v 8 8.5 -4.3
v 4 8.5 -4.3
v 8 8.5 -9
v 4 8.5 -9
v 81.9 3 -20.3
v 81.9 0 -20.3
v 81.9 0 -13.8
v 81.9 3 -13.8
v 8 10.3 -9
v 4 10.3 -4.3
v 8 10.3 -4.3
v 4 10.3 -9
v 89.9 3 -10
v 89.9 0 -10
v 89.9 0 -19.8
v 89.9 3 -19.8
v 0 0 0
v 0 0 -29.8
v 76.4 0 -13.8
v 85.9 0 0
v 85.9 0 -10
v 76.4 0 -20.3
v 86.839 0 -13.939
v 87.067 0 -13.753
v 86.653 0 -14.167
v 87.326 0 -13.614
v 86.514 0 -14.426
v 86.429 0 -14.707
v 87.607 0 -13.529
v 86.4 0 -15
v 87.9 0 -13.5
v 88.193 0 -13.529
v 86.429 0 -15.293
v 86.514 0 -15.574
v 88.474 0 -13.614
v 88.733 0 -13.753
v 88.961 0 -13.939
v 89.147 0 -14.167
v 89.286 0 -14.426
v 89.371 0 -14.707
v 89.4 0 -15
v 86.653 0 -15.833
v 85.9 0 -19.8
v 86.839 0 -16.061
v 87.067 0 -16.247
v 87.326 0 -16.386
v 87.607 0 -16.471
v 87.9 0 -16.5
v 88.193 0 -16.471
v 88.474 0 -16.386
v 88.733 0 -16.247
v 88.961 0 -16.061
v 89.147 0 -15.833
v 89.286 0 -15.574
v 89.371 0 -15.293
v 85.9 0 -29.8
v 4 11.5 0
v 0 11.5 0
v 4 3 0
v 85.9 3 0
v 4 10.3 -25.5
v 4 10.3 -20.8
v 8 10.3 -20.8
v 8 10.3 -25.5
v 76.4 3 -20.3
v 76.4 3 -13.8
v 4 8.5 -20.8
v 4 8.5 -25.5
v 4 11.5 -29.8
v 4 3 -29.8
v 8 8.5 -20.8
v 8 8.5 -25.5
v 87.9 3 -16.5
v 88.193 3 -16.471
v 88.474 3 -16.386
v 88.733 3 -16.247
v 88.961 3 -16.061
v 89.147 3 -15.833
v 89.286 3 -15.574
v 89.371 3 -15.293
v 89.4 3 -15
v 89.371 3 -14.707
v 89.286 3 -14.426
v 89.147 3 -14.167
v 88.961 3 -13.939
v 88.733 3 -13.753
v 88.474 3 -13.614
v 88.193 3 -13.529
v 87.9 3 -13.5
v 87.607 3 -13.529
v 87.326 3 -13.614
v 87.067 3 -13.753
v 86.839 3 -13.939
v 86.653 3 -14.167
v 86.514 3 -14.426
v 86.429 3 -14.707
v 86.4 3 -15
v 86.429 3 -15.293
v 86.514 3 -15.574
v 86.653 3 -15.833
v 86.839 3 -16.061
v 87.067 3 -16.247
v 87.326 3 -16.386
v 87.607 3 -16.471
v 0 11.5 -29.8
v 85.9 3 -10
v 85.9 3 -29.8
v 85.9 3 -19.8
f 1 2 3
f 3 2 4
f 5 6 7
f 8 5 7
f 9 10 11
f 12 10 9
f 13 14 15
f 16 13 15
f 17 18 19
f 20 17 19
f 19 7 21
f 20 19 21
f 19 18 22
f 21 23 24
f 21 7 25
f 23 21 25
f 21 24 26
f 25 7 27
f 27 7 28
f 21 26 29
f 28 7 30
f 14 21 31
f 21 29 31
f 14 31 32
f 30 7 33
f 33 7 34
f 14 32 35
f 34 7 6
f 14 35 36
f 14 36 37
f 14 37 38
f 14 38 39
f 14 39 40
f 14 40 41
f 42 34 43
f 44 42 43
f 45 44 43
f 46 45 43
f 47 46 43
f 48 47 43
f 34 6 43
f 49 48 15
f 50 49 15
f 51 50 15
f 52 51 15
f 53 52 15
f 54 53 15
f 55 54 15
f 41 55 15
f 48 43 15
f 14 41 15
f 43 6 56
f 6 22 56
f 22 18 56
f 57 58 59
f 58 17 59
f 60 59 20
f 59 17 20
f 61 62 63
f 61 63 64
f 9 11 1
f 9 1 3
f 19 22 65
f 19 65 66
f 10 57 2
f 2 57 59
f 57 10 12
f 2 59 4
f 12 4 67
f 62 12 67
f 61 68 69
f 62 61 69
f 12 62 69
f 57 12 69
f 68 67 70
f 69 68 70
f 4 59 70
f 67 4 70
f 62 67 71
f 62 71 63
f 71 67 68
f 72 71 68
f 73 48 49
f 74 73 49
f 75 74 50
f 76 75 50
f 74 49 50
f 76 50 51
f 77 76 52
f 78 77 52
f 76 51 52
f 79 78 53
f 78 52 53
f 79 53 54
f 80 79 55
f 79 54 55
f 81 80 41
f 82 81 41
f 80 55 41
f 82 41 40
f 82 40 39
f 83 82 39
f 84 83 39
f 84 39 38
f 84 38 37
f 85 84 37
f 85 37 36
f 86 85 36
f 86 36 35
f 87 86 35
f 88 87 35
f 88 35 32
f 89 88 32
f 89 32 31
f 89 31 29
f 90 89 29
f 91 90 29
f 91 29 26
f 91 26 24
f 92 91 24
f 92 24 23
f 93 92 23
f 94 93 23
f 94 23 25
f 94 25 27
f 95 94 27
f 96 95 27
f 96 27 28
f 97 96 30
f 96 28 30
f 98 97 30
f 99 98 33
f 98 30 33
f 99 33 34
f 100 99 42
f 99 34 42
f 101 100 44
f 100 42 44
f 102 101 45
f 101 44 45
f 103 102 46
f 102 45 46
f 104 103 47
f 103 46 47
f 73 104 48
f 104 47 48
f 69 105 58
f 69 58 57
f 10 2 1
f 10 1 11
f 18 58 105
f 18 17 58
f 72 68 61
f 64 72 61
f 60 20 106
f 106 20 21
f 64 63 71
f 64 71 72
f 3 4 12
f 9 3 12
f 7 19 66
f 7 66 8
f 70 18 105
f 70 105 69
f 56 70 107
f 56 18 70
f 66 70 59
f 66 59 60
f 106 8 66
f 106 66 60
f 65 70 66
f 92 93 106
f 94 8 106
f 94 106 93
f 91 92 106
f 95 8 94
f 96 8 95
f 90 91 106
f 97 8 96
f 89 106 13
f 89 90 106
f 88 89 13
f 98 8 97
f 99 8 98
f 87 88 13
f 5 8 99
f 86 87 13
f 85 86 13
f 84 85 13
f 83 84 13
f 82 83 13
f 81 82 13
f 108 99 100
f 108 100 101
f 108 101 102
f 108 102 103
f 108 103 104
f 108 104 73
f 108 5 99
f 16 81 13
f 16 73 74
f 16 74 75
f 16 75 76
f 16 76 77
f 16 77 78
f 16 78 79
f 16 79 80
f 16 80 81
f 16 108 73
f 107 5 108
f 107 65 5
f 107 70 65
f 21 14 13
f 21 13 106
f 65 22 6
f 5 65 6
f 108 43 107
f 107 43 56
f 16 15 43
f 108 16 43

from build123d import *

# Parameters (mm, degrees)
SKETCH1_W           = 89.9
SKETCH1_H           = 29.8
BOSS_EXTRUDE1_DEPTH = 3
SKETCH8_R           = 1.5
SKETCH8_W           = 4
SKETCH8_H           = 10
CUT_EXTRUDE5_DEPTH  = 5
SKETCH12_W          = 5.5
SKETCH12_H          = 6.5
CUT_EXTRUDE8_DEPTH  = 10
SKETCH15_W          = 4
SKETCH15_H          = 29.8
BOSS_EXTRUDE2_DEPTH = 8.5
SKETCH16_W          = 4.7
SKETCH16_H          = 1.8
BOSS_EXTRUDE3_DEPTH = 4


with BuildPart() as part:
    # Sketch1 → Boss-Extrude1 (new body)
    with BuildSketch(Plane(origin=(0, 0, 0), x_dir=(1, 0, 0), z_dir=(0, 1, 0))):
        with Locations((44.95, 14.9)):
            Rectangle(SKETCH1_W, SKETCH1_H)
    extrude(amount=BOSS_EXTRUDE1_DEPTH)

    # Sketch8 → Cut-Extrude5 (cut)
    with BuildSketch(Plane(origin=(0, 0, 0), x_dir=(-1, 0, 0), z_dir=(0, -1, 0))):
        with Locations(Location((-87.9, 15, 0), (0, 0, 90))):
            Circle(SKETCH8_R)
        with Locations((-87.9, 5)):
            Rectangle(SKETCH8_W, SKETCH8_H)
        with Locations((-87.9, 24.8)):
            Rectangle(SKETCH8_W, SKETCH8_H)
    extrude(amount=-CUT_EXTRUDE5_DEPTH, mode=Mode.SUBTRACT)

    # Sketch12 → Cut-Extrude8 (cut)
    with BuildSketch(Plane.XZ):
        with Locations((79.15, -17.05)):
            Rectangle(SKETCH12_W, SKETCH12_H)
    extrude(amount=-CUT_EXTRUDE8_DEPTH, mode=Mode.SUBTRACT)

    # Sketch15 → Boss-Extrude2 (add)
    with BuildSketch(Plane(origin=(0, 3, 0), x_dir=(1, 0, 0), z_dir=(0, 1, 0))):
        with Locations((2, 14.9)):
            Rectangle(SKETCH15_W, SKETCH15_H)
    extrude(amount=BOSS_EXTRUDE2_DEPTH)

    # Sketch16 → Boss-Extrude3 (add)
    with BuildSketch(Plane(origin=(4, 0, 0), x_dir=(0, 0, -1), z_dir=(1, 0, 0))):
        with Locations((6.65, 9.4)):
            Rectangle(SKETCH16_W, SKETCH16_H)
        with Locations((23.15, 9.4)):
            Rectangle(SKETCH16_W, SKETCH16_H)
    extrude(amount=BOSS_EXTRUDE3_DEPTH)


solid = part.part
